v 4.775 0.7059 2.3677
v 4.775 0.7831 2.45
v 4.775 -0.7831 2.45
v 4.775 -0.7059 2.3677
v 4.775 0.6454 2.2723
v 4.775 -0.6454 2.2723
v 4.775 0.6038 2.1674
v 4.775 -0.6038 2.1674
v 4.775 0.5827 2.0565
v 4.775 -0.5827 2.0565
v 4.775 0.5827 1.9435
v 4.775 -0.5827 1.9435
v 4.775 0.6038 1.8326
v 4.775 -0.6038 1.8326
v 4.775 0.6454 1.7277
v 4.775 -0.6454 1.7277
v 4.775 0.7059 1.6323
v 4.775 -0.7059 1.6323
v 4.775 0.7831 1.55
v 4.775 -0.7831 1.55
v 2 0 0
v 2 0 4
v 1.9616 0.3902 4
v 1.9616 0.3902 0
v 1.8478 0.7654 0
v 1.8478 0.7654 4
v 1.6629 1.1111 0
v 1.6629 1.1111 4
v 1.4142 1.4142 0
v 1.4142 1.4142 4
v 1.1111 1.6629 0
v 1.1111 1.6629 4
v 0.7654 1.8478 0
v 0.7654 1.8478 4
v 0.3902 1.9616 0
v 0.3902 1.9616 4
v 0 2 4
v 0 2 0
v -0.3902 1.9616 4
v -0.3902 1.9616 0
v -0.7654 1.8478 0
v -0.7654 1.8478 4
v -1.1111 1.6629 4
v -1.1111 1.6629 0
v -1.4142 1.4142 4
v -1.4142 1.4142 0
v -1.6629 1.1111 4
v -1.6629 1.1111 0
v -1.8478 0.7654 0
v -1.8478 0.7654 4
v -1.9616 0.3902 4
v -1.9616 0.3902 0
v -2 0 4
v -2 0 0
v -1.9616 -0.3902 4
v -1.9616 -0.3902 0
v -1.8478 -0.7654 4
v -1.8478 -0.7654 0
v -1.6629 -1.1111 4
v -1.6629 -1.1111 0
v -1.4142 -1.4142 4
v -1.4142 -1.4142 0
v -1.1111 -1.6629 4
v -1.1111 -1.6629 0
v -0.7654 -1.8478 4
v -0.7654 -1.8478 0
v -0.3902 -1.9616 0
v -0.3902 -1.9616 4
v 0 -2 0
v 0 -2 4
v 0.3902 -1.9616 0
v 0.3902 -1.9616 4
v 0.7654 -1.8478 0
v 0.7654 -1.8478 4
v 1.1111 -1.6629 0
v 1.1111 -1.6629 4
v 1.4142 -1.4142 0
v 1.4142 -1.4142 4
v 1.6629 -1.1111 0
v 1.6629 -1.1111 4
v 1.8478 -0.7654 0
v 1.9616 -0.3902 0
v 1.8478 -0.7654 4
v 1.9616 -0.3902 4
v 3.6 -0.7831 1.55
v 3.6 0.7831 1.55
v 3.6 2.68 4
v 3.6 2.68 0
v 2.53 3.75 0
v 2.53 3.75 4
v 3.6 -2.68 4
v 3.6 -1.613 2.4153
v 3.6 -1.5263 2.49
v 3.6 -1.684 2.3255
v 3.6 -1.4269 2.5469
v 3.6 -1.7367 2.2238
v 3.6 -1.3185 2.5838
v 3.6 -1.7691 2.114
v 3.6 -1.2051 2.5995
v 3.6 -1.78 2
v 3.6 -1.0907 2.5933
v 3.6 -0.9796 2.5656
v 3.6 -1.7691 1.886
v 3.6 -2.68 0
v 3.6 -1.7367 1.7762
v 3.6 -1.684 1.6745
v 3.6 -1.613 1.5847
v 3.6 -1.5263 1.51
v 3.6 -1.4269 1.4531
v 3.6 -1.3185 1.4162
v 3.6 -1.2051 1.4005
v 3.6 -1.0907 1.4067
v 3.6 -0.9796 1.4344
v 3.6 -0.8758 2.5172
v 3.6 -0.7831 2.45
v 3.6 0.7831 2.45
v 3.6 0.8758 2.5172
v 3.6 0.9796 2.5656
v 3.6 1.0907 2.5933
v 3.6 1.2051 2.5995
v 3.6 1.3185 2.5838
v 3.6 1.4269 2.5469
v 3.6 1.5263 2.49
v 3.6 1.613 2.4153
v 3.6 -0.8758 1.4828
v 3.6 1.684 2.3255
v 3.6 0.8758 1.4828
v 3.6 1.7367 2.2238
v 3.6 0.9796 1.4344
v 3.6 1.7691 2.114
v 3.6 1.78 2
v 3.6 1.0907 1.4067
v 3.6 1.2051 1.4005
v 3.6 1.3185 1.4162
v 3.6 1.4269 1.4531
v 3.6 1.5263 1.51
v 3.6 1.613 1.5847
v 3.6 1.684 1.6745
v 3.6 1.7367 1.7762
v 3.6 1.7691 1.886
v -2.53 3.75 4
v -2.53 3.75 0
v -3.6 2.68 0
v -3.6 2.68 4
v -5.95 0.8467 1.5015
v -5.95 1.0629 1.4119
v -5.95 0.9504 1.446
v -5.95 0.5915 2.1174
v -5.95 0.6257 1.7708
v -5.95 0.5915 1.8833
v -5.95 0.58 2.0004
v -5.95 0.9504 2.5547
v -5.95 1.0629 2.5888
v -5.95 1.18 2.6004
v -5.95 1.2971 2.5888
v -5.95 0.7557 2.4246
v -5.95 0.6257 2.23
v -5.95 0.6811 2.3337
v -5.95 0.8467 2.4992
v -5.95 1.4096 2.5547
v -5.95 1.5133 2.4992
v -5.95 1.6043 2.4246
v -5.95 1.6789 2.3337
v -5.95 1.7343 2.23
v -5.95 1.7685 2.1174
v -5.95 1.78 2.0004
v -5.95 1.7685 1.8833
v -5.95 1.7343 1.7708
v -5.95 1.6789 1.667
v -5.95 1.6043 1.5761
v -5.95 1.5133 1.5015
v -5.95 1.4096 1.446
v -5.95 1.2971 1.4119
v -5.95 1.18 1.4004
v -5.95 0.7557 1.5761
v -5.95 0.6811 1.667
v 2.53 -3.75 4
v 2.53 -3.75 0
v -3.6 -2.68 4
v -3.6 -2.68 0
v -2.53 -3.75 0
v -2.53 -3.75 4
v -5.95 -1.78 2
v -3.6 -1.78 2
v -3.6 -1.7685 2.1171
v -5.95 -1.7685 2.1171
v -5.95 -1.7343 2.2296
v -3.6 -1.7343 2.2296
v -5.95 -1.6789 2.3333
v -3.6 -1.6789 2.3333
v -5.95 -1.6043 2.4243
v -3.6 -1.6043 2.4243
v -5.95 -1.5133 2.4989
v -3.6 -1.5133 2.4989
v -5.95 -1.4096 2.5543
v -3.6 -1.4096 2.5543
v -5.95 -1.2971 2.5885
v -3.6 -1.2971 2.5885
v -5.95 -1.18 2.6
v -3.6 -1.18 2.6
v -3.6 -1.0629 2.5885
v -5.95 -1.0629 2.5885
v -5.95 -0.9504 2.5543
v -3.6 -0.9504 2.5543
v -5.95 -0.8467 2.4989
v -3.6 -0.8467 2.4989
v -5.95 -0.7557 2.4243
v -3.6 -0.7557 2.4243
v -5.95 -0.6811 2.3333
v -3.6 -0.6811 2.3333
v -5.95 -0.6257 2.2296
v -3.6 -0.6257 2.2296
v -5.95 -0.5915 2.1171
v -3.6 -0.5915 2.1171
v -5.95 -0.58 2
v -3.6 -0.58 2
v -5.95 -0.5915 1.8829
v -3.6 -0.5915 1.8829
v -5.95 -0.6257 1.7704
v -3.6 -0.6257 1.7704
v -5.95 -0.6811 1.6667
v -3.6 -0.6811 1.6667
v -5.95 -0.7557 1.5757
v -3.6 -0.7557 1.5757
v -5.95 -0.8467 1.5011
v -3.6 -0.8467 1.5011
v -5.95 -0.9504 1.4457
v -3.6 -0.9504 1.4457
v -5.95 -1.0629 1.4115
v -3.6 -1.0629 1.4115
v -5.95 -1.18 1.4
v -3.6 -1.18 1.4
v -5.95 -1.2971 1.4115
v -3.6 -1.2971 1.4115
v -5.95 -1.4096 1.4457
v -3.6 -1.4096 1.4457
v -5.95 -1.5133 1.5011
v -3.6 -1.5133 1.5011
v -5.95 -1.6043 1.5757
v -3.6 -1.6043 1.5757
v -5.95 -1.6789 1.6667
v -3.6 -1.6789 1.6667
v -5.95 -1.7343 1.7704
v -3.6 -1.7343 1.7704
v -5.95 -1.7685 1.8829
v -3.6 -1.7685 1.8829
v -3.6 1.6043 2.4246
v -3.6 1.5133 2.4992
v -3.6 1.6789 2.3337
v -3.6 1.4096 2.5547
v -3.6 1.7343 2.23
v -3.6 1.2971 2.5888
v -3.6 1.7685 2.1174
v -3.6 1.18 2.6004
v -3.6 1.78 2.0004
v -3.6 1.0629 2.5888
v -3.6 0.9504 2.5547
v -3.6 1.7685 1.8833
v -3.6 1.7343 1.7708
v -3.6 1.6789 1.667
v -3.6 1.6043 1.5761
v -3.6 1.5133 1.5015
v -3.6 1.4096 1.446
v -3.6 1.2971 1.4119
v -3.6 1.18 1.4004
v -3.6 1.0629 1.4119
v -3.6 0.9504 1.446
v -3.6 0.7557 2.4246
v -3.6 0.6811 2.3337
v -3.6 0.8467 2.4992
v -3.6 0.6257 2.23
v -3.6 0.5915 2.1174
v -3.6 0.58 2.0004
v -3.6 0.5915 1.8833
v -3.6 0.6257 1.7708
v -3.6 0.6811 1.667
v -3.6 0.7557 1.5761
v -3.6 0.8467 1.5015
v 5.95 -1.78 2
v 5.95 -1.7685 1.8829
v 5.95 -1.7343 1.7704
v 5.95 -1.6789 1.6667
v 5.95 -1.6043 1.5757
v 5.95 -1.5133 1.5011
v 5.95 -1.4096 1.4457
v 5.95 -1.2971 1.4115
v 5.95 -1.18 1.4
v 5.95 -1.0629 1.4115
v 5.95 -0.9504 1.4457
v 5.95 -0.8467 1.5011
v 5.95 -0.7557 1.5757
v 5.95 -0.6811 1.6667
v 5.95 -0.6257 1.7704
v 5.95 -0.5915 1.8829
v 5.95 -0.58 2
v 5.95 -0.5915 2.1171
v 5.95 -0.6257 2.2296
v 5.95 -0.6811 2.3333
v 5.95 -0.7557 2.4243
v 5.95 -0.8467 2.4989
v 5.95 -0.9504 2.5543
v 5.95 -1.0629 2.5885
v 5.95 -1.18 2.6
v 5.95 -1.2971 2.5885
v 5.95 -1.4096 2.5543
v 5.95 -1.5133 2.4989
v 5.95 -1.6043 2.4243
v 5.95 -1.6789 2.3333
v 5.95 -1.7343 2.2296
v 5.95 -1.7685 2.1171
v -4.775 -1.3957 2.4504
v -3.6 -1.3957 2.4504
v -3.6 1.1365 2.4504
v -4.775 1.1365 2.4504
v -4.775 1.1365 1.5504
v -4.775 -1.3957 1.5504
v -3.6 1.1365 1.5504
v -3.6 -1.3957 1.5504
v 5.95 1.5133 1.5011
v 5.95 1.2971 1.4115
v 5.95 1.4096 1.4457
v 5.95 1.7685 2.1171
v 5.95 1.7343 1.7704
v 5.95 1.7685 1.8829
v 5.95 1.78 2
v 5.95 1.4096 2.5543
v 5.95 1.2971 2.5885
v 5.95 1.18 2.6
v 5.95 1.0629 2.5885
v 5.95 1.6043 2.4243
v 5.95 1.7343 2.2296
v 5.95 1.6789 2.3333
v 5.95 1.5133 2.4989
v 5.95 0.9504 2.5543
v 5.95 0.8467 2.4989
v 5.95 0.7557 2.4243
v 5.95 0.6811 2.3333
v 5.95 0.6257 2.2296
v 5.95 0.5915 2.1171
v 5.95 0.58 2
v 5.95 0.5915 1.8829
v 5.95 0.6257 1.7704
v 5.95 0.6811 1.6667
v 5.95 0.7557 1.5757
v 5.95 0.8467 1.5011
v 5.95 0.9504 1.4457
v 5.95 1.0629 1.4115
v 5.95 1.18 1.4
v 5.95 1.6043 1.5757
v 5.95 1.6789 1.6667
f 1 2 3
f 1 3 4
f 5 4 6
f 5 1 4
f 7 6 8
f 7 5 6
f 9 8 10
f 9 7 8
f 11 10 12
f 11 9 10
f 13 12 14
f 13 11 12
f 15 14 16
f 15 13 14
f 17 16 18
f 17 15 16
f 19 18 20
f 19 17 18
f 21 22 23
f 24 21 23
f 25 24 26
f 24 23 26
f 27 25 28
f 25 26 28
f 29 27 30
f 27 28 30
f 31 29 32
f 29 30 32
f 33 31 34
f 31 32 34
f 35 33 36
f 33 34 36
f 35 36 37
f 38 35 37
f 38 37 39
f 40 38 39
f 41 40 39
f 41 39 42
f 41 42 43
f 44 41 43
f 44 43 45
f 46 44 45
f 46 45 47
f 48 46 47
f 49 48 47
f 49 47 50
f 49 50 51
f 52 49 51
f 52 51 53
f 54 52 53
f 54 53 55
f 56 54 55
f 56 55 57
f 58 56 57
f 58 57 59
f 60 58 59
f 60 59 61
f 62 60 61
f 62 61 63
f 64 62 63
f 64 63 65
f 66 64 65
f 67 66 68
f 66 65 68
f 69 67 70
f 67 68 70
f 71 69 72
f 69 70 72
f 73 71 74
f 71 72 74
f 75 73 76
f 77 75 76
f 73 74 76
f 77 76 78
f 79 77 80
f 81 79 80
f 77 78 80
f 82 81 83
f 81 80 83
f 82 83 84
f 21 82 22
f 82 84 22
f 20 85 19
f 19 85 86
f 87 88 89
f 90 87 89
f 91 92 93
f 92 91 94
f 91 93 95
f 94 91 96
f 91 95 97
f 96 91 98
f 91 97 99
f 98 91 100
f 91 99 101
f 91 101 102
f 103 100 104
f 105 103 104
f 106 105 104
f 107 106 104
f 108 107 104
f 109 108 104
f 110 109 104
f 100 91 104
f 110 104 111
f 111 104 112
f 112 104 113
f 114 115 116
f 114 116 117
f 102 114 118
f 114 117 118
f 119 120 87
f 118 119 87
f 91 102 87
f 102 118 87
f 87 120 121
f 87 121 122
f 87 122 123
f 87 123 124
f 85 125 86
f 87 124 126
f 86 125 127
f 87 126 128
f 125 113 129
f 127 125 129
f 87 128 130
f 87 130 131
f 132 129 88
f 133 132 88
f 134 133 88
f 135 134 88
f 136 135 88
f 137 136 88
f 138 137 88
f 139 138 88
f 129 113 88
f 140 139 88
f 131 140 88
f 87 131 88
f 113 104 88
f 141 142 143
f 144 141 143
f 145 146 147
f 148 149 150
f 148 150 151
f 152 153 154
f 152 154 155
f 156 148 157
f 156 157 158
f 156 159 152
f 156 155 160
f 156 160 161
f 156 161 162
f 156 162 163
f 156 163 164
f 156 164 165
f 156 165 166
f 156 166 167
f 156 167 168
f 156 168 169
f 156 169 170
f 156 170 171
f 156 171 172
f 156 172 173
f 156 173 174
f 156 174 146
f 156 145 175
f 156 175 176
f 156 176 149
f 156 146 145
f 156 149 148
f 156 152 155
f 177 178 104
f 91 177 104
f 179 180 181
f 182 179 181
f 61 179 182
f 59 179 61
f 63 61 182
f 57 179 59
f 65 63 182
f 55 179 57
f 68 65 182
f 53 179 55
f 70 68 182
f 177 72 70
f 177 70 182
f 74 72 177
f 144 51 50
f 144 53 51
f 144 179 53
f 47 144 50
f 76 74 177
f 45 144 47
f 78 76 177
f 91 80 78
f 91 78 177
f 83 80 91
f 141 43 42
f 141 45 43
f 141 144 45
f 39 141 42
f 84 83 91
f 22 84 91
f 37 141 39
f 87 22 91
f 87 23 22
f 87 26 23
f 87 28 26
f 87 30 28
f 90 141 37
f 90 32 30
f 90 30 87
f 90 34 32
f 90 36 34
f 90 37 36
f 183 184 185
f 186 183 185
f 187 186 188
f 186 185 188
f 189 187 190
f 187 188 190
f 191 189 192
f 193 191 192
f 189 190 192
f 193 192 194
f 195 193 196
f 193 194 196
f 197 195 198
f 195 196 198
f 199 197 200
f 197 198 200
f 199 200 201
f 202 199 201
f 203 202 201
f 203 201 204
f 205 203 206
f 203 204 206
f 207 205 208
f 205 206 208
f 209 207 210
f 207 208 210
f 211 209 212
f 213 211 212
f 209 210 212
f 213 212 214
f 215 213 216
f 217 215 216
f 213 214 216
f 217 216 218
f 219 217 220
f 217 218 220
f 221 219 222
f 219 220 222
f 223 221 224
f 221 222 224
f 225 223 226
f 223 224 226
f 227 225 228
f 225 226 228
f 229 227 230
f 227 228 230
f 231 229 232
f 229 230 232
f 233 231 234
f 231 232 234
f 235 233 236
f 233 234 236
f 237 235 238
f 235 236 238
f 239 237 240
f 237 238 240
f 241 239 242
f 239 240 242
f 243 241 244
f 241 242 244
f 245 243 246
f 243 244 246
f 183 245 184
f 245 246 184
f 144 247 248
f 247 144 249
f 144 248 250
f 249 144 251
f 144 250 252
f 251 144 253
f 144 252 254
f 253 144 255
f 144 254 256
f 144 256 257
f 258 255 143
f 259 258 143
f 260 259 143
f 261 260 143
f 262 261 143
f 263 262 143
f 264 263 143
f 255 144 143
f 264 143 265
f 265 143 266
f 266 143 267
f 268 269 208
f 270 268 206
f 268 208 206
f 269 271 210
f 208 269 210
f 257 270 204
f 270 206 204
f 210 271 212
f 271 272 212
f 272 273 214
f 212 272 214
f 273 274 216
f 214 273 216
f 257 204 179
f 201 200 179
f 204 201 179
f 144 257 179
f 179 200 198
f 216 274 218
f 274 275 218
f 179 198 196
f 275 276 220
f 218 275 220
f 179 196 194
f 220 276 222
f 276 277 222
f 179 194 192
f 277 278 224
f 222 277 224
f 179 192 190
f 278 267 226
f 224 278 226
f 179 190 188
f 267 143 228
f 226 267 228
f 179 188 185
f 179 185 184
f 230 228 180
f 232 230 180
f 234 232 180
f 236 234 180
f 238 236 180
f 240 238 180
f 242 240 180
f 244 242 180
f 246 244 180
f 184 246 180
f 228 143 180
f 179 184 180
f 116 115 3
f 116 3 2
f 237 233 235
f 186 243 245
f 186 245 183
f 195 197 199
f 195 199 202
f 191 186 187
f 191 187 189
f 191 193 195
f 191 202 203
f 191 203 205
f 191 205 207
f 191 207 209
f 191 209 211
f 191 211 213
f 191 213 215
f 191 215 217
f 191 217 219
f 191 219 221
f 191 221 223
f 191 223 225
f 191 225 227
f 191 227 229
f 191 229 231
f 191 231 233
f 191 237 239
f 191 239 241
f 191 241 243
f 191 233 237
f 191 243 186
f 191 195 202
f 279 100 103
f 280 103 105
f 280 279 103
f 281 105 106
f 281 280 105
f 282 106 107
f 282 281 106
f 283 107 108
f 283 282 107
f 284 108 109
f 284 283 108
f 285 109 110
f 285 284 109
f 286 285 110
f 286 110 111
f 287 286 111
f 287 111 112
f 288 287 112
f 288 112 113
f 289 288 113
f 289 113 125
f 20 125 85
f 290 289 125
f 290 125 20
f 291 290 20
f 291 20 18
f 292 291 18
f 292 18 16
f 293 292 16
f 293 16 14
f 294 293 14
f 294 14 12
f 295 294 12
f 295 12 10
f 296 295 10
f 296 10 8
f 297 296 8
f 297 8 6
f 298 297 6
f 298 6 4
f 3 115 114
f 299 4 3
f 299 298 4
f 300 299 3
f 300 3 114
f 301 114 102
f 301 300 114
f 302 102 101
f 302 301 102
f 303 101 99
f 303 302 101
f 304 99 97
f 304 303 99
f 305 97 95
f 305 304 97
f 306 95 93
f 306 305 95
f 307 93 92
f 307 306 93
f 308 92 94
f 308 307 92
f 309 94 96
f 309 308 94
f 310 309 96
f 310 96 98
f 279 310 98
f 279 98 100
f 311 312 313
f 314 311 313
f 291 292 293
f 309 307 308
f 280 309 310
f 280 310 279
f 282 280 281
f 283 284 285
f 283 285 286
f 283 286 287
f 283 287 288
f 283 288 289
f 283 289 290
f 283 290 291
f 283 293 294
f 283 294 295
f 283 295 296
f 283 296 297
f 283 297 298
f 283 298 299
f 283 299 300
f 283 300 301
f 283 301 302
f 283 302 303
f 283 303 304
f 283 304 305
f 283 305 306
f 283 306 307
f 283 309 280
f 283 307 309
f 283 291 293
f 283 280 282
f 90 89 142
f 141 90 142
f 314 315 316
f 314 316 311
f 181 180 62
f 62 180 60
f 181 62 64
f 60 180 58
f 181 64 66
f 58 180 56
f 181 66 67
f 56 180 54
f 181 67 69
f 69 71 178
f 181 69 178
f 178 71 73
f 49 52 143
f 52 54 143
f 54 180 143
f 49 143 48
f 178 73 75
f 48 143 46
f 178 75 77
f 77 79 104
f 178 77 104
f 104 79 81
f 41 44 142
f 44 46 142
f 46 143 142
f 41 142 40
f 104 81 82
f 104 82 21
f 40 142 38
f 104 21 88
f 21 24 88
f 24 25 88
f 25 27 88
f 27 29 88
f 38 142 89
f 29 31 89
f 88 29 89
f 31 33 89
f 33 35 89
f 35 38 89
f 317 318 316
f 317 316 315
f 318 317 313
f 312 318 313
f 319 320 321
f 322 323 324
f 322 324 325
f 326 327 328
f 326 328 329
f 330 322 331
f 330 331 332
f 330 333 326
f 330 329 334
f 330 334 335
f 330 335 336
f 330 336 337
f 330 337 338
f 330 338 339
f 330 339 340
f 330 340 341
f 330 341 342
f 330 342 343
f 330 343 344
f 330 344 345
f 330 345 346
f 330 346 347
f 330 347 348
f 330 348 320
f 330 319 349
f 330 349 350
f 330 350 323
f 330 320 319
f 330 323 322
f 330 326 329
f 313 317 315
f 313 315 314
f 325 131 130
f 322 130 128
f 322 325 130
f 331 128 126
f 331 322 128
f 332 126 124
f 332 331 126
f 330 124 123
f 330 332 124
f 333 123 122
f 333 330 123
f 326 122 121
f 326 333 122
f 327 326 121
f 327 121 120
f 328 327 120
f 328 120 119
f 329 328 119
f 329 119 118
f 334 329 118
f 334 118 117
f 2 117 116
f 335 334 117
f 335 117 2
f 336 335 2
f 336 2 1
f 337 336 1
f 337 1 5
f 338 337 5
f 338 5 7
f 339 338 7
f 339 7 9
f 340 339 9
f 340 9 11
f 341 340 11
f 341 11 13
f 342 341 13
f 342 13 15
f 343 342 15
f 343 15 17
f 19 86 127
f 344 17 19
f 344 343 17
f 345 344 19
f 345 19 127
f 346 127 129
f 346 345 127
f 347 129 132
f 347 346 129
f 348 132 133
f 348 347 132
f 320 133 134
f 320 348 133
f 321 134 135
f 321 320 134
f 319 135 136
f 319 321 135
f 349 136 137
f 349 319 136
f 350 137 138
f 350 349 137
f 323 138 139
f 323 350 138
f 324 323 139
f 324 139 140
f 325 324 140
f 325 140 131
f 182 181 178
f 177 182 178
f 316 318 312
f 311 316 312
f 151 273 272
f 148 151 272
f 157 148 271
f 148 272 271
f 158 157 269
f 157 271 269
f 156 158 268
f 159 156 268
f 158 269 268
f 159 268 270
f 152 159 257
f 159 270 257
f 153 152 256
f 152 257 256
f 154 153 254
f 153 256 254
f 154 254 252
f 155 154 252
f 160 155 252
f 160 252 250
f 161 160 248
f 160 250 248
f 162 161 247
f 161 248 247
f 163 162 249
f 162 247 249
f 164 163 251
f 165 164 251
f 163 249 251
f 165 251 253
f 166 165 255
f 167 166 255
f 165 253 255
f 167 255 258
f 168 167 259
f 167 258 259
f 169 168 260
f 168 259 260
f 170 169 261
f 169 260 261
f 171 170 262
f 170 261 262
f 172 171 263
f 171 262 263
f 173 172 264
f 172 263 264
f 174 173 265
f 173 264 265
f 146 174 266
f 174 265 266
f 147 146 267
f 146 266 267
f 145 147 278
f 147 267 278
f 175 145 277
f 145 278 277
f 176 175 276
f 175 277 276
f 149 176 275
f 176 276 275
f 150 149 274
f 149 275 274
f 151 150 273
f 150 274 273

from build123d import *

# Parameters (mm, degrees)
BOSS_EXTRUDE1_DEPTH = 4
SKETCH2_R           = 2
CUT_EXTRUDE1_DEPTH  = 7.559153909
SKETCH3_R           = 0.6
BOSS_EXTRUDE4_DEPTH = 2.35
SKETCH5_W           = 0.9
SKETCH5_H           = 2.53219409
BOSS_EXTRUDE5_DEPTH = 1.175
BOSS_EXTRUDE6_START = 2.35
SKETCH6_R           = 0.6
BOSS_EXTRUDE6_DEPTH = 2.35
SKETCH8_W           = 0.9
SKETCH8_H           = 2.405916694
BOSS_EXTRUDE7_DEPTH = 1.175


with BuildPart() as part:
    # Sketch1 → Boss-Extrude1 (new body)
    with BuildSketch(Plane.XY):
        Polygon((-2.53, 3.75), (-3.6, 2.68), (-3.6, -2.68), (-2.53, -3.75), (2.53, -3.75), (3.6, -2.68), (3.6, 2.68), (2.53, 3.75), align=None)
    extrude(amount=BOSS_EXTRUDE1_DEPTH)

    # Sketch2 → Cut-Extrude1 (cut, through all)
    with BuildSketch(Plane.XY.offset(4)):
        Circle(SKETCH2_R)
    extrude(amount=-CUT_EXTRUDE1_DEPTH, mode=Mode.SUBTRACT)

    # Sketch3 → Boss-Extrude4 (add)
    with BuildSketch(Plane.ZY.offset(3.6)):
        with Locations(Location((2.00036098, 1.18, 0), (0, 0, 270))):
            Circle(SKETCH3_R)
        with Locations(Location((2, -1.18, 0), (0, 0, 270))):
            Circle(SKETCH3_R)
    extrude(amount=BOSS_EXTRUDE4_DEPTH)

    # Sketch6 → Boss-Extrude6 (add)
    with BuildSketch(Plane(origin=(3.6, 0, 0), x_dir=(0, 0, -1), z_dir=(1, 0, 0)).offset(BOSS_EXTRUDE6_START)):
        with Locations(Location((-2, 1.18, 0), (0, 0, 90))):
            Circle(SKETCH6_R)
        with Locations(Location((-2, -1.18, 0), (0, 0, 270))):
            Circle(SKETCH6_R)
    extrude(amount=-BOSS_EXTRUDE6_DEPTH)

    # Sketch8 → Boss-Extrude7 (add)
    with BuildSketch(Plane(origin=(3.6, 0, 0), x_dir=(0, 0, -1), z_dir=(1, 0, 0))):
        with Locations((-2, 0.039877072)):
            Rectangle(SKETCH8_W, SKETCH8_H)
    extrude(amount=BOSS_EXTRUDE7_DEPTH)


with BuildPart() as body_2:
    # Sketch5 → Boss-Extrude5 (new body)
    with BuildSketch(Plane.ZY.offset(3.6)):
        with Locations((2.00036098, -0.129600485)):
            Rectangle(SKETCH5_W, SKETCH5_H)
    extrude(amount=BOSS_EXTRUDE5_DEPTH)


solid = Compound([part.part, body_2.part])
